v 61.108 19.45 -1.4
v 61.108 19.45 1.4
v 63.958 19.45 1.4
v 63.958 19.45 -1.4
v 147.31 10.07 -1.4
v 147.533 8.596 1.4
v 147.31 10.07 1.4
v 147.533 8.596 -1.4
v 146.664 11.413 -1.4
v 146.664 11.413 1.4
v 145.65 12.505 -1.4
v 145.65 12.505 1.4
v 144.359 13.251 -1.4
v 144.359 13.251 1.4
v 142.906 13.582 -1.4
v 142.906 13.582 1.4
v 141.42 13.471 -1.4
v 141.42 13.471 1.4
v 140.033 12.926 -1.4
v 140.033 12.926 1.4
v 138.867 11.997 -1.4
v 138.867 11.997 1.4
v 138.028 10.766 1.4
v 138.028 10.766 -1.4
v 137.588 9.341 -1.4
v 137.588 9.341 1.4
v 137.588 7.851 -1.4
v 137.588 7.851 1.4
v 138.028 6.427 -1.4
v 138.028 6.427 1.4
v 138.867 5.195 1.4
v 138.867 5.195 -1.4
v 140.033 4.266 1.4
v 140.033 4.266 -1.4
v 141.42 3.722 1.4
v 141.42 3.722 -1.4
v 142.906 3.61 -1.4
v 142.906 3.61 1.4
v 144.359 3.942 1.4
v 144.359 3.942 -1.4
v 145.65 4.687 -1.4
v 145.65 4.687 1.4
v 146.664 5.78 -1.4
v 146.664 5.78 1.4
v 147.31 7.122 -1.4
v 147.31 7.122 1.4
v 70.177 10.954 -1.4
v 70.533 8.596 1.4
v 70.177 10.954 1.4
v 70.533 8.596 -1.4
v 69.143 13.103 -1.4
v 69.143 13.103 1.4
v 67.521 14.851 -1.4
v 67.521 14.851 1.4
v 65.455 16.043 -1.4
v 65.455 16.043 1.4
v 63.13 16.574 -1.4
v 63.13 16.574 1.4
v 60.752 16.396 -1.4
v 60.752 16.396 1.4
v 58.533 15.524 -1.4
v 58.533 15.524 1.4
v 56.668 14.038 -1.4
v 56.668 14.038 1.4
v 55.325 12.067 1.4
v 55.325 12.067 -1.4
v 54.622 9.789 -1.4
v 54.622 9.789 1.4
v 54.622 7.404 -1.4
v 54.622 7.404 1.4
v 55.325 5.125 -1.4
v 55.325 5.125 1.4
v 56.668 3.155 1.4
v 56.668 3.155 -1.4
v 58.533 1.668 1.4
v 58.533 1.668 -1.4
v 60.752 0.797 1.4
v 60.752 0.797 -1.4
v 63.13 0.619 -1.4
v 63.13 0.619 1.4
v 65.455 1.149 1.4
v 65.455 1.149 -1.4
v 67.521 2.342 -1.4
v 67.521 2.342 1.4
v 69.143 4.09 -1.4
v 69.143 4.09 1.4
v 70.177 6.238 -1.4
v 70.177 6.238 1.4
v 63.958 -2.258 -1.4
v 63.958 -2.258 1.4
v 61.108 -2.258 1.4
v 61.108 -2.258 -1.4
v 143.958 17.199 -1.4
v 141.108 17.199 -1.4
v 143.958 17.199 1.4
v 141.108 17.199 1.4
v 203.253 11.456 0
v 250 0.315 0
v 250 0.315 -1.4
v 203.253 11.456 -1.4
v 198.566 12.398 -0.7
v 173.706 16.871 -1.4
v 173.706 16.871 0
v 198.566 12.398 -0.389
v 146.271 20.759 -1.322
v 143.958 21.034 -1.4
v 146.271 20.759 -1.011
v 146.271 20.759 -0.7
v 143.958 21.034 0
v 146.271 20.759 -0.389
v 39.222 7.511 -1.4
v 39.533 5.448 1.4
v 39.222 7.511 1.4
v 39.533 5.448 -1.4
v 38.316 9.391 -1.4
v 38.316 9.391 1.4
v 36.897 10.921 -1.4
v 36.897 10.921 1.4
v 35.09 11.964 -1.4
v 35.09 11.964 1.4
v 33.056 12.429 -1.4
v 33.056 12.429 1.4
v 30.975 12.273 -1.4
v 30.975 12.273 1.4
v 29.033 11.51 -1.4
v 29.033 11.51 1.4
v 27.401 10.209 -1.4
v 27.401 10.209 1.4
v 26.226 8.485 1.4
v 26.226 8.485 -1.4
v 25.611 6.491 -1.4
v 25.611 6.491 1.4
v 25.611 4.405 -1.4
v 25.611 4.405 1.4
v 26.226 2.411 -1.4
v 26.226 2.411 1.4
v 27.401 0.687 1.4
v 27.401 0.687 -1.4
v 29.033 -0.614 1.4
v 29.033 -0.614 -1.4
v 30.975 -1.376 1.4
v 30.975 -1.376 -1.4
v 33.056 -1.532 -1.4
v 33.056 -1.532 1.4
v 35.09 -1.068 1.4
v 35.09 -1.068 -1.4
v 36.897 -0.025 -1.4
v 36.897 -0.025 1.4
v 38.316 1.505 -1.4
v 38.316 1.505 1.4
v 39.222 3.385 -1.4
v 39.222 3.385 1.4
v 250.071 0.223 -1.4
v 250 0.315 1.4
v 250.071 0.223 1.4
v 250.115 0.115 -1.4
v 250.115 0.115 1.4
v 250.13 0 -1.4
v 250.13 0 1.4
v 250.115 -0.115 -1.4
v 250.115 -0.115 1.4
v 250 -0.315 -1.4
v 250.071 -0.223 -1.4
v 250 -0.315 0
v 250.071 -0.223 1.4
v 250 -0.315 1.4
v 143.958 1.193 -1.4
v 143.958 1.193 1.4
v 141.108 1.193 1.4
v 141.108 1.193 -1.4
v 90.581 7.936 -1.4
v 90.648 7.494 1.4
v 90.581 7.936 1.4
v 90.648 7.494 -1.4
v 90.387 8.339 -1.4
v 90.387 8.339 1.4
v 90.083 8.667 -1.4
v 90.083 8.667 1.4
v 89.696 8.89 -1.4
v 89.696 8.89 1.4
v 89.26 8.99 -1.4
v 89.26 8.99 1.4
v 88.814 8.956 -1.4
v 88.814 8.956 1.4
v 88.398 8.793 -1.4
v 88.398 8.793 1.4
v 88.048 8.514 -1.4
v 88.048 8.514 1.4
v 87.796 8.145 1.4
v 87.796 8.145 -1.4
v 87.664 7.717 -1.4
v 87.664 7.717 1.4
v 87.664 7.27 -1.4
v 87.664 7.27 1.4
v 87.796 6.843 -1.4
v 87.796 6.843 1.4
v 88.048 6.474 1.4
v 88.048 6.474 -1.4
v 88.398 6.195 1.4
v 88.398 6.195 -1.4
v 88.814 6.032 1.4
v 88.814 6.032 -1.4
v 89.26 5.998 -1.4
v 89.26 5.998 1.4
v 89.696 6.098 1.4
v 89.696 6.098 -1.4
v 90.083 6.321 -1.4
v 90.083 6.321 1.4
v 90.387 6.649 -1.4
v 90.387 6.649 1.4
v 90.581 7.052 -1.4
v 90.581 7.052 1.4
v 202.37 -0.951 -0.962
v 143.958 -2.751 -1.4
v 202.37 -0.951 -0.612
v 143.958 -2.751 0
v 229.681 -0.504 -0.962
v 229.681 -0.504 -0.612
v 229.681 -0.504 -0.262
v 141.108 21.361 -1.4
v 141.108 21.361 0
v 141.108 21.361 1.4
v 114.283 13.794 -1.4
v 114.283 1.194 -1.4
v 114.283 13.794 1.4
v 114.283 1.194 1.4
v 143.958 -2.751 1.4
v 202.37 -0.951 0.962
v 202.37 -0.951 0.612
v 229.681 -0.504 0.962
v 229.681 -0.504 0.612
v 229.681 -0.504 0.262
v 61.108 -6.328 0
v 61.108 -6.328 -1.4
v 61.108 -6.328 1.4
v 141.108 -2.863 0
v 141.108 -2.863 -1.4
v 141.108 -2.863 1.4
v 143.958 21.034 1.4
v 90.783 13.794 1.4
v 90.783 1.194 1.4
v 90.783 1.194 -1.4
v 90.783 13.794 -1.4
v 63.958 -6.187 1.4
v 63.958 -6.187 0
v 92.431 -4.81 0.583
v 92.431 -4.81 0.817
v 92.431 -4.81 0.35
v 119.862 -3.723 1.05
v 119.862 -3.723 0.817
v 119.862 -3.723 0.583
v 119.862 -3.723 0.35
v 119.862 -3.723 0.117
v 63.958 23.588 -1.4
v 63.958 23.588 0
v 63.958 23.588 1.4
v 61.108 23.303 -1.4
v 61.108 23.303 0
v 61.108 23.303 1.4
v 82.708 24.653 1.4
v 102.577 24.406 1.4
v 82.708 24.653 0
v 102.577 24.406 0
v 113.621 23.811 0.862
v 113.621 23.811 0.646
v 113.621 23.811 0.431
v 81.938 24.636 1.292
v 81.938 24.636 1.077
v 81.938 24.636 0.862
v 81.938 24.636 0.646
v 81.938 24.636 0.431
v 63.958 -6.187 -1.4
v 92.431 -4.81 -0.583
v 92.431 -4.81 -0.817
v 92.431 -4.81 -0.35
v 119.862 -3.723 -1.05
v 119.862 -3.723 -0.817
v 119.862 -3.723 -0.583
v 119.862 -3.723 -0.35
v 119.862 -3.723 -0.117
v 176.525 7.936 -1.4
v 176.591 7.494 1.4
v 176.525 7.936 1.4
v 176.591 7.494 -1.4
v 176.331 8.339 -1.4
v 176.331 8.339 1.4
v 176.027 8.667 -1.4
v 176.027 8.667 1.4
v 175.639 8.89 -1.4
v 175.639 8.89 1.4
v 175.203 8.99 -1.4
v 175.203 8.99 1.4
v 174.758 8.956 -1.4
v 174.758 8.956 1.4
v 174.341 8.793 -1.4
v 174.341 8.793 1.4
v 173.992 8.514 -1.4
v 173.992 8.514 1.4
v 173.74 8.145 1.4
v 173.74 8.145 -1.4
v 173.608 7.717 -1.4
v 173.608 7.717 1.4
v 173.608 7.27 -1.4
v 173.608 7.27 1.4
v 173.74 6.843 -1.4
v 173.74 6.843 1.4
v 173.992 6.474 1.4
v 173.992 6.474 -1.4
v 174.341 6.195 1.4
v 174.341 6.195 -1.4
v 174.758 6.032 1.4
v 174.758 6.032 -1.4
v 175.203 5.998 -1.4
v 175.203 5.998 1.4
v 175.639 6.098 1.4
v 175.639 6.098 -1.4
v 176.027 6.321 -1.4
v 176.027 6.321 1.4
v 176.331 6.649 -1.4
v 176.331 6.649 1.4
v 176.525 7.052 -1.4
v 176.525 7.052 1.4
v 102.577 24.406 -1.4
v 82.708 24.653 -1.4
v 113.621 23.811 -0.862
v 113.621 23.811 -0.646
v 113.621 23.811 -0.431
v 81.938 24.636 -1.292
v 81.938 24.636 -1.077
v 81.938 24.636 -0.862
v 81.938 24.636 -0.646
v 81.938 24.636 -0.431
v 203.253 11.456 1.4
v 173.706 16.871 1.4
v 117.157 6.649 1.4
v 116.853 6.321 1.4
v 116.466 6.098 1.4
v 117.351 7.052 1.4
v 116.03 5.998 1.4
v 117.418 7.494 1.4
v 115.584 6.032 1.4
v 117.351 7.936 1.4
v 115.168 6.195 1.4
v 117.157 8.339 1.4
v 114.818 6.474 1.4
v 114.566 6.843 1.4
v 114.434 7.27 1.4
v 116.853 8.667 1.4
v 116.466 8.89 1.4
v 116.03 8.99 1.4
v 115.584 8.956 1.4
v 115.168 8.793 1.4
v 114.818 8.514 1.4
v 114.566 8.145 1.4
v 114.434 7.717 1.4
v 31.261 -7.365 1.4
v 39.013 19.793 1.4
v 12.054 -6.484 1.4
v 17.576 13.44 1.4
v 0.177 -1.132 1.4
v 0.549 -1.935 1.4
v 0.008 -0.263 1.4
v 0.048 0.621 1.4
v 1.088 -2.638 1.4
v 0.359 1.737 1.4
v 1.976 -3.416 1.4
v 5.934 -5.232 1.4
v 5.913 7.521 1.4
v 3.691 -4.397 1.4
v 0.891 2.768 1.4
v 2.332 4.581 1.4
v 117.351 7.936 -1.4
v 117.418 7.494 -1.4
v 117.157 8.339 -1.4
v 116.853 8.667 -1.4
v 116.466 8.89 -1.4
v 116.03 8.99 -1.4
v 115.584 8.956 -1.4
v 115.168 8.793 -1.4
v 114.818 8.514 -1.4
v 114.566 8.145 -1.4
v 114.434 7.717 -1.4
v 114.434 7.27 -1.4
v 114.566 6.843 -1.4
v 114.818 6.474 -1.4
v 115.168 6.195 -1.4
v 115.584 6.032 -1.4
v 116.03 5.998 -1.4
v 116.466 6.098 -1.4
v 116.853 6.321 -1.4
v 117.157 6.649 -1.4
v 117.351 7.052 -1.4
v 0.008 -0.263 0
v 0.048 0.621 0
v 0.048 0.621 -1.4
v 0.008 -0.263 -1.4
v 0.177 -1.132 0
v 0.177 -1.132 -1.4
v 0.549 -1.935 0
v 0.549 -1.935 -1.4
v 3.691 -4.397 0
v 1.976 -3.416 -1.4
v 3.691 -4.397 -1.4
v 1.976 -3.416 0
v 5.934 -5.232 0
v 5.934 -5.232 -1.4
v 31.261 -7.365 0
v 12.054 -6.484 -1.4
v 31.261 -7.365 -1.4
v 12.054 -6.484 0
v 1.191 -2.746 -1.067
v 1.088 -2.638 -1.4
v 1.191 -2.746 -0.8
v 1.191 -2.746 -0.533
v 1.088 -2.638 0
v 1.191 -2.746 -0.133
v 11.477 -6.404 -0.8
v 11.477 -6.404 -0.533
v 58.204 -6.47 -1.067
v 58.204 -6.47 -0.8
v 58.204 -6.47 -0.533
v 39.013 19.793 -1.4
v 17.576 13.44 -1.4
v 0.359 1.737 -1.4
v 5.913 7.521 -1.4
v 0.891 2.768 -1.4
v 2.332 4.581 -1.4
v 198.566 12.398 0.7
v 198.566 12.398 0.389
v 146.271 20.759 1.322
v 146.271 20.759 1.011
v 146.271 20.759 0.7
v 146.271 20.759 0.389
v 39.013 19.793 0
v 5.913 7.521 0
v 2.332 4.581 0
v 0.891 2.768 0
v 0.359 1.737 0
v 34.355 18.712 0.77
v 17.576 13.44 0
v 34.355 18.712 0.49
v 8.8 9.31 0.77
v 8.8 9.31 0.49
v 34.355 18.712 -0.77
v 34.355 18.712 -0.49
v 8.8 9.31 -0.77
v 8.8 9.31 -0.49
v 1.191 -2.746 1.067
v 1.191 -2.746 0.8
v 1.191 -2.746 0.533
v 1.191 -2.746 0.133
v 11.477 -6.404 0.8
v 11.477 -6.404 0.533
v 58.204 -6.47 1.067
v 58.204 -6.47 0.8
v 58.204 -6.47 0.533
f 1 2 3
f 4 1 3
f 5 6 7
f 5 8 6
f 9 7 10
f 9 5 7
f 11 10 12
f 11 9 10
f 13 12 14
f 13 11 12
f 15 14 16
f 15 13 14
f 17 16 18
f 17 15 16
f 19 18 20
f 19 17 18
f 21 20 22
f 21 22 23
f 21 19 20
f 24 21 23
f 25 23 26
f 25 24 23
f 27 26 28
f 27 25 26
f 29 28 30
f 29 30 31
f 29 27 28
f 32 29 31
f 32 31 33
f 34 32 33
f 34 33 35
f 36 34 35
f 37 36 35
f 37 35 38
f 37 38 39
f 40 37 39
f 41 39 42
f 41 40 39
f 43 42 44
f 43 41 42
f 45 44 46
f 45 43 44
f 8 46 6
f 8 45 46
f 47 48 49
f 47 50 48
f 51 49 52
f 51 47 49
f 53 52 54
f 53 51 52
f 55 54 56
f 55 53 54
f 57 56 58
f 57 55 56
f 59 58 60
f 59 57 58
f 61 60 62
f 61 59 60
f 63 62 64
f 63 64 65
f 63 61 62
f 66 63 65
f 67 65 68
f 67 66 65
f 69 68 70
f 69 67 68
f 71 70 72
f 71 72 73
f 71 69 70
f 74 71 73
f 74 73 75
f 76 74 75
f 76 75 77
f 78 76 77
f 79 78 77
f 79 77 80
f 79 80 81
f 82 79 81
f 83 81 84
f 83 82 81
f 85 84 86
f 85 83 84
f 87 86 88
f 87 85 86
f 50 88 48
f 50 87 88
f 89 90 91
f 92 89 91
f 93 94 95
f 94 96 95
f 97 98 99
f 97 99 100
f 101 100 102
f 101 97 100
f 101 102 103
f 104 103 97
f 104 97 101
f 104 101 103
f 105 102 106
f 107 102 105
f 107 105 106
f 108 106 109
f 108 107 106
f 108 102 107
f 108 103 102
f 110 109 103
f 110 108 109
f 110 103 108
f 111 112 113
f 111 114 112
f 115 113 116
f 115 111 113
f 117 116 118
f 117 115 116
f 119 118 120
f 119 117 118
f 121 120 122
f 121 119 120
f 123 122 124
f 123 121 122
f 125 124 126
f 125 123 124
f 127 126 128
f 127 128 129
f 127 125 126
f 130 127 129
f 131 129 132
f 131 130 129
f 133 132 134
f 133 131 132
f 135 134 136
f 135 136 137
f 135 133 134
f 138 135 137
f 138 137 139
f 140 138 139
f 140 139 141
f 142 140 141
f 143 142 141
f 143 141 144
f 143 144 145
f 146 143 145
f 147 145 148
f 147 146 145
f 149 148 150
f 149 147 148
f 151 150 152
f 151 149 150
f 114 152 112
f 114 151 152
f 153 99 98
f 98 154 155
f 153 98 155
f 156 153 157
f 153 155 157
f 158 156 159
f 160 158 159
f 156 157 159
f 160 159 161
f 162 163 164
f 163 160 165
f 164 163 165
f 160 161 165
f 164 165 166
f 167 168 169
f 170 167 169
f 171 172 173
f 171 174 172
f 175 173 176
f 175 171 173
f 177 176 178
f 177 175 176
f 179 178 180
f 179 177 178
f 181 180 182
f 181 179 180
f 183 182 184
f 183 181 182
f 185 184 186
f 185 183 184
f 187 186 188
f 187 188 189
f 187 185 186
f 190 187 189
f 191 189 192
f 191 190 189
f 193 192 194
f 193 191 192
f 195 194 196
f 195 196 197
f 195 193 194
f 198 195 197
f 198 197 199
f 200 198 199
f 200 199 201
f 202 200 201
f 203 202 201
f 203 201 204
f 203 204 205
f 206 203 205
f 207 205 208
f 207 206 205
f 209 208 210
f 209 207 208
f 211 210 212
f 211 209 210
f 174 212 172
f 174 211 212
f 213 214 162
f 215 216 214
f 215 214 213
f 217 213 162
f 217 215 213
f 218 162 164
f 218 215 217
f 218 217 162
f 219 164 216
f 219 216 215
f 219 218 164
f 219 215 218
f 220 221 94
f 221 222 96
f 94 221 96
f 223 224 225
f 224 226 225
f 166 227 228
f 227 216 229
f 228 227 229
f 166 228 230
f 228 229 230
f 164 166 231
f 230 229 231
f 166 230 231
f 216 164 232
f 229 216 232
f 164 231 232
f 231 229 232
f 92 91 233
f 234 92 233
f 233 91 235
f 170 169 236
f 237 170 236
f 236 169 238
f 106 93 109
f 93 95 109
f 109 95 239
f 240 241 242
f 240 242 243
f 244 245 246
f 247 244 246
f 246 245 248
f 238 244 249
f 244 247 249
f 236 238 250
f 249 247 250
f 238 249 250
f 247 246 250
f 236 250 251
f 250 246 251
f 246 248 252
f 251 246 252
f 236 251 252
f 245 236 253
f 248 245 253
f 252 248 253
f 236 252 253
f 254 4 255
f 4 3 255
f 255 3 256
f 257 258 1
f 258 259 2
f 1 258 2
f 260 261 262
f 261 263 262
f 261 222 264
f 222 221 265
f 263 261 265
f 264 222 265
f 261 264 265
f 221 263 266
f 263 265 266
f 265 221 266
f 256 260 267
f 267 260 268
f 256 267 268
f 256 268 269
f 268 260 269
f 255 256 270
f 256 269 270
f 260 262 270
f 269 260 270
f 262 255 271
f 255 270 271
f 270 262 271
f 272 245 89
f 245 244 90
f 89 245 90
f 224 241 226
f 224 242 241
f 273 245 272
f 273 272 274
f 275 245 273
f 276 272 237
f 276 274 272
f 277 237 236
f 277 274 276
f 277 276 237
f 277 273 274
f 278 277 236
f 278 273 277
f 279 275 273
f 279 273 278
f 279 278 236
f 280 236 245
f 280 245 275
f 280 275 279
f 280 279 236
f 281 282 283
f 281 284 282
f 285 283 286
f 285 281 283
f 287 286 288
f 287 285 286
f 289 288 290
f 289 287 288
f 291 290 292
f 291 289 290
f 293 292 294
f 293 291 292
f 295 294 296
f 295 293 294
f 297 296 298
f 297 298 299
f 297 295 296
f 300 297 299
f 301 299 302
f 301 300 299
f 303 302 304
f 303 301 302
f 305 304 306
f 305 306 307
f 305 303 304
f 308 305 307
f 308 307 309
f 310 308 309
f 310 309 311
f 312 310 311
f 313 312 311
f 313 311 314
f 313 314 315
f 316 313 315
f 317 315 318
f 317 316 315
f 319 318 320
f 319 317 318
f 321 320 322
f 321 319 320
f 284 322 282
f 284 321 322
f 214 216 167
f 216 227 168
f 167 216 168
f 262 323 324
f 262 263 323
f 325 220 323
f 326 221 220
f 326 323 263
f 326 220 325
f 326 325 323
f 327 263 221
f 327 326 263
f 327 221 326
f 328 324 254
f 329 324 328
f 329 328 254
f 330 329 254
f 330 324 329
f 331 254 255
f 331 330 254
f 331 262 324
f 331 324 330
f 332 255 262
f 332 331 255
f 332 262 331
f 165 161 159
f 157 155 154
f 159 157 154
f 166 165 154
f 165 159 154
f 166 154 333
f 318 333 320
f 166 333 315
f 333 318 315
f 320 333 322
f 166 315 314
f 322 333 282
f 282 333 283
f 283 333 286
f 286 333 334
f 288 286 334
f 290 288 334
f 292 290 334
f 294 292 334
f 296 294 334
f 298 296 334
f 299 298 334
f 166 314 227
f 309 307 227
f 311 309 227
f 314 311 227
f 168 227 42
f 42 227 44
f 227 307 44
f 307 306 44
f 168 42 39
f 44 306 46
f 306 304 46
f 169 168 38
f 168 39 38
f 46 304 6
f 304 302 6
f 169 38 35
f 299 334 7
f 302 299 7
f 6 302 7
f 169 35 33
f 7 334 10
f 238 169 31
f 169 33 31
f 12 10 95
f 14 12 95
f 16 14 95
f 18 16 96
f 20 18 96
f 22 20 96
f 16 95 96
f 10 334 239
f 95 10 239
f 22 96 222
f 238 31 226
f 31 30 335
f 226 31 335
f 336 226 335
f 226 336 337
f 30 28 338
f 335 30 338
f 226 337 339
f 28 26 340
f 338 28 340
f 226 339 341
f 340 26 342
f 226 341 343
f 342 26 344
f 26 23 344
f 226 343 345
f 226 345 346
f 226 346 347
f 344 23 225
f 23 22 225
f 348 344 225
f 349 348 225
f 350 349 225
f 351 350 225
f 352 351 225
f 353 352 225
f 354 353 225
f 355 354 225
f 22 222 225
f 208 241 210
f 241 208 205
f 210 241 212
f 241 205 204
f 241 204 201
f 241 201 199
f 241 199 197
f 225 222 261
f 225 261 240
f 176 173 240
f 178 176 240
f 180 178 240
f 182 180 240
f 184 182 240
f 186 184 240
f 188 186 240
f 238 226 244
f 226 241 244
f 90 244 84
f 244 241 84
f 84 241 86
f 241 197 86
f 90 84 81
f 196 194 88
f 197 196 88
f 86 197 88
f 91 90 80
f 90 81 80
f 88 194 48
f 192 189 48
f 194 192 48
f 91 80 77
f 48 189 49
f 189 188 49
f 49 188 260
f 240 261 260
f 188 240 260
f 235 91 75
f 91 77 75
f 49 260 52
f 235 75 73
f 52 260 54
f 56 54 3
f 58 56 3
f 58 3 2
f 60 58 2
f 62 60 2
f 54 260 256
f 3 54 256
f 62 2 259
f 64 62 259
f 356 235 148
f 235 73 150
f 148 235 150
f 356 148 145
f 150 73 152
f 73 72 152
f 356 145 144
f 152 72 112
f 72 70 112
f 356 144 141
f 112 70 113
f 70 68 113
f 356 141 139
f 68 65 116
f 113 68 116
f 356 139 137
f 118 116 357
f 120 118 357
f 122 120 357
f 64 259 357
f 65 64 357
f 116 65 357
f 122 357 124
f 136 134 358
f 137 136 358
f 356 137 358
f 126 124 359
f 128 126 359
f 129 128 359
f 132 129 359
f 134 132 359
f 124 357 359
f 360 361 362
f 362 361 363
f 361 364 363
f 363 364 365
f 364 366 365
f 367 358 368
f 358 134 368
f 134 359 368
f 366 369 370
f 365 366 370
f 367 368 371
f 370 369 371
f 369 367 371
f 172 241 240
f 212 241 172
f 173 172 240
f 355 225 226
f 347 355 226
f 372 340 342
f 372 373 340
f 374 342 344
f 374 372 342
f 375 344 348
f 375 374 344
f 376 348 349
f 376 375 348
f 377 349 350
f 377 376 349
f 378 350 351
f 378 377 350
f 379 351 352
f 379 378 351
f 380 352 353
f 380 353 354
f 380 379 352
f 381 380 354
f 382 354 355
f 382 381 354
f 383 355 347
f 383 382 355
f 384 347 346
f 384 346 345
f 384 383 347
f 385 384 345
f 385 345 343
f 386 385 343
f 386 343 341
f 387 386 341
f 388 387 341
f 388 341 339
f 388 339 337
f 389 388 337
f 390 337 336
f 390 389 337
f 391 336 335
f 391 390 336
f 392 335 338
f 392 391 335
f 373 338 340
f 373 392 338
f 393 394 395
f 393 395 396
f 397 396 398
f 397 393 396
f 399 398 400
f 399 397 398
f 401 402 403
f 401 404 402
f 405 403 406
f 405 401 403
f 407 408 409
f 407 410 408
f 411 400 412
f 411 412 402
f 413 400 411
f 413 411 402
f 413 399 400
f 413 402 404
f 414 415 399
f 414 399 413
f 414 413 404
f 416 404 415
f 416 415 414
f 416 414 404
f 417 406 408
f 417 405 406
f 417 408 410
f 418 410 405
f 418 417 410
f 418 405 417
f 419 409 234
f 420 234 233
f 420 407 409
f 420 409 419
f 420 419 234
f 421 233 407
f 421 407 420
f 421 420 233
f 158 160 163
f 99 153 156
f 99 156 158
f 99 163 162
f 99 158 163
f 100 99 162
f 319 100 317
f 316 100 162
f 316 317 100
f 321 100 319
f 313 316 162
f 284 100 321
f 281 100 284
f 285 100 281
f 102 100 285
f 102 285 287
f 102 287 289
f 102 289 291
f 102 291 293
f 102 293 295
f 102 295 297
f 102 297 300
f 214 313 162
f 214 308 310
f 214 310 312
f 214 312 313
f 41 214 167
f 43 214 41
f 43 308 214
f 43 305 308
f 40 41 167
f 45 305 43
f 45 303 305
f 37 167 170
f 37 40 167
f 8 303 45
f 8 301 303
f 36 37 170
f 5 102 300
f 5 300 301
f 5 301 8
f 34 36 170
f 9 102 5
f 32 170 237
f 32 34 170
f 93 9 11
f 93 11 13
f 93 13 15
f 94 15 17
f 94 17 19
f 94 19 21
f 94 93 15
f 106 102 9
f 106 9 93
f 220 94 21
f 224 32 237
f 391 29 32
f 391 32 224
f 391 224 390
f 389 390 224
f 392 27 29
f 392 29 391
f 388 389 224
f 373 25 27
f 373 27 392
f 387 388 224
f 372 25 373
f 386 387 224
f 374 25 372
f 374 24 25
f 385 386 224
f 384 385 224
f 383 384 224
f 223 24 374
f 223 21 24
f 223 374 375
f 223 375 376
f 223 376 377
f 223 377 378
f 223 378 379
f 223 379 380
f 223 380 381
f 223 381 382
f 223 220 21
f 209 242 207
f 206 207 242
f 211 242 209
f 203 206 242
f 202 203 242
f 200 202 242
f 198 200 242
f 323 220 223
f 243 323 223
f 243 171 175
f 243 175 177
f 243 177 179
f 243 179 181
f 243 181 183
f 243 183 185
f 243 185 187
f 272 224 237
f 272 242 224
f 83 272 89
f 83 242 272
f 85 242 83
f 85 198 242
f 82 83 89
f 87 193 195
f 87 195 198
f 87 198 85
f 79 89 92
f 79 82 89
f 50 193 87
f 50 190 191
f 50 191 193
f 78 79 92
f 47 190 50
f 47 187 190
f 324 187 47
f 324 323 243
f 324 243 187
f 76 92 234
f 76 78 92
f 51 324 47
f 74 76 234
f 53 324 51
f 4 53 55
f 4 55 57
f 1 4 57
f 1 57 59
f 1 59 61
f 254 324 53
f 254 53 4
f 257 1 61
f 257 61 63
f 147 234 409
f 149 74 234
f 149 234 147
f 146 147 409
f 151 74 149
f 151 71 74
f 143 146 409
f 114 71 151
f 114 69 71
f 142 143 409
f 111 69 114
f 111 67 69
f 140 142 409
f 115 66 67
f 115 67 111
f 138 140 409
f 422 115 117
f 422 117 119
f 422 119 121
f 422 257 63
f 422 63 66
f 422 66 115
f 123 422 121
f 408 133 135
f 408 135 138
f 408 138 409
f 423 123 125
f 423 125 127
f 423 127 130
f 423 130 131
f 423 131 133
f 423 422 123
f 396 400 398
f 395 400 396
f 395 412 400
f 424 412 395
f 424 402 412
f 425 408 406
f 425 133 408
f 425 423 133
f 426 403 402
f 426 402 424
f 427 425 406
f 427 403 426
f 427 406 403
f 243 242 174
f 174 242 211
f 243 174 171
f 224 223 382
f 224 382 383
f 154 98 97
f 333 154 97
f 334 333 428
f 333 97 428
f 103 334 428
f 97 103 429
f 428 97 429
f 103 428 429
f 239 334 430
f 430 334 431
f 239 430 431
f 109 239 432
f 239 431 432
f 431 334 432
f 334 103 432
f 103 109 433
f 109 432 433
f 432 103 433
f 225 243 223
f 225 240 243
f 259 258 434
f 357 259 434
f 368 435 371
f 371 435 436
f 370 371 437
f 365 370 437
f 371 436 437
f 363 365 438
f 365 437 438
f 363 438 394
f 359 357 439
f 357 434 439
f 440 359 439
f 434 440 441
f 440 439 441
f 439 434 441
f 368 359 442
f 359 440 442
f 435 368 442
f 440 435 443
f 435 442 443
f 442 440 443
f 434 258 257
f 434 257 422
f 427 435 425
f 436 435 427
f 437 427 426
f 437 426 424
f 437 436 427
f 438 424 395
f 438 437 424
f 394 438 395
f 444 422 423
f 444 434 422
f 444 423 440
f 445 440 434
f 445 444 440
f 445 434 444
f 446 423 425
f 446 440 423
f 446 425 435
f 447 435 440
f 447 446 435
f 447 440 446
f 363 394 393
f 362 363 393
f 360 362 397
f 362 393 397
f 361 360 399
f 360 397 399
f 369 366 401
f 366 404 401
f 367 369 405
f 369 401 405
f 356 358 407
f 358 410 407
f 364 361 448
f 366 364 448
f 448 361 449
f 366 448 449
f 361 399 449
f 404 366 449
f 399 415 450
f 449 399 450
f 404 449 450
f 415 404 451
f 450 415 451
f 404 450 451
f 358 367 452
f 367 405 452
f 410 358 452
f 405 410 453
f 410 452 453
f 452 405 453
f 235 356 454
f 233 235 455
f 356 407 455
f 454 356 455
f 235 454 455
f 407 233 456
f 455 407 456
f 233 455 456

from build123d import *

# Parameters (mm, degrees)
SKETCH_1_R      = 8
SKETCH_1_R_2    = 5
SKETCH_1_R_3    = 7
SKETCH_1_R_4    = 1.5
SKETCH_1_W      = 23.5
SKETCH_1_H      = 12.6
EXTRUDE_1_DEPTH = 1.4


with BuildPart() as part:
    # Эскиз1 → Бобышка-Вытянуть1 (new, symmetric)
    with BuildSketch(Plane.XY):
        with BuildLine():
            Line((61.107619318, 19.450139662), (63.957619318, 19.450139662))
            Line((63.957619318, 19.450139662), (63.957619318, 23.588464287))
            add(Edge.make_bspline(
                [(141.107619318, 21.360787161), (140.647203073, 21.412583326), (138.008124909, 21.706530989), (133.19183673, 22.212004255), (126.658683026, 22.825721434), (120.136770918, 23.363973271), (113.62856714, 23.824677329), (107.152732037, 24.200242598), (100.741095693, 24.498399513), (94.411752715, 24.686649771), (88.155917993, 24.740095652), (81.949043055, 24.658849145), (75.780520591, 24.441013809), (69.785413798, 24.089605746), (65.850842722, 23.766532071), (63.957619318, 23.588464287)],
                knots=[0.429723551, 0.429723551, 0.429723551, 0.429723551, 0.435103874, 0.460559416, 0.485959195, 0.51130307, 0.536551515, 0.561723366, 0.586628867, 0.611085431, 0.6352512, 0.659272176, 0.683163753, 0.706922144, 0.729003809, 0.729003809, 0.729003809, 0.729003809], degree=3))
            Line((141.107619318, 21.360787161), (141.107619318, 17.19883932))
            Line((141.107619318, 17.19883932), (143.957619318, 17.19883932))
            Line((143.957619318, 17.19883932), (143.957619318, 21.033629847))
            add(Edge.make_bspline(
                [(250, 0.315), (249.15566774, 0.545019818), (246.720175698, 1.208516243), (242.391332083, 2.358339053), (236.849761204, 3.787625364), (230.779918279, 5.298008837), (224.455917947, 6.812866028), (218.030543496, 8.291610632), (211.562405045, 9.719735057), (205.072411509, 11.092374932), (198.567970913, 12.407850726), (192.052369914, 13.665297924), (185.527619973, 14.864093303), (178.995338991, 16.003404779), (172.457064741, 17.082388115), (165.914317095, 18.099827841), (159.368680729, 19.054501815), (152.821805128, 19.944885603), (147.683892721, 20.591912914), (144.728786809, 20.943344409), (143.957619318, 21.033629847)],
                knots=[0, 0, 0, 0, 0.0101622, 0.029313053, 0.052011605, 0.076619468, 0.101948061, 0.127526132, 0.153184131, 0.178867888, 0.204557903, 0.230245712, 0.255925967, 0.281594302, 0.30724642, 0.332878042, 0.358484538, 0.384061186, 0.409602822, 0.418619192, 0.418619192, 0.418619192, 0.418619192], degree=3))
            ThreePointArc((250, 0.315), (250.130477272, 0), (250, -0.315))
            add(Edge.make_bspline(
                [(143.957619318, -2.751209627), (145.13020609, -2.705557458), (148.596084852, -2.571725453), (154.352602411, -2.355626415), (161.225044134, -2.109369921), (168.090869746, -1.876634074), (174.951578522, -1.658643104), (181.808595966, -1.456378123), (188.663234462, -1.270383377), (195.516645168, -1.101112884), (202.369532894, -0.948617189), (211.49919029, -0.767742353), (220.603098666, -0.619939742), (229.617630172, -0.50292618), (236.087353854, -0.431514192), (241.980776913, -0.376520461), (246.558970011, -0.339535886), (249.120490965, -0.321271242), (250, -0.315)],
                knots=[0.581490104, 0.581490104, 0.581490104, 0.581490104, 0.595379569, 0.622543445, 0.64967326, 0.676775201, 0.703855228, 0.730918775, 0.757971338, 0.785017763, 0.812061651, 0.839103366, 0.893099152, 0.919831065, 0.945809917, 0.969680601, 0.989589706, 1, 1, 1, 1], degree=3))
            Line((143.957619318, -2.751209627), (143.957619318, 1.193130543))
            Line((143.957619318, 1.193130543), (141.107619318, 1.193130543))
            Line((141.107619318, 1.193130543), (141.107619318, -2.86287629))
            add(Edge.make_bspline(
                [(63.957619318, -6.186566126), (64.317823095, -6.168514758), (66.969747676, -6.035316313), (71.910772709, -5.784005174), (78.771375576, -5.439680449), (85.610498609, -5.110951246), (92.432107589, -4.804953317), (99.25503119, -4.531981644), (106.097378404, -4.278274658), (112.96921168, -4.00308991), (119.864404254, -3.723176166), (126.773860473, -3.440067276), (133.855552455, -3.151608468), (138.633361552, -2.960411351), (141.107619318, -2.86287629)],
                knots=[0.265564796, 0.265564796, 0.265564796, 0.265564796, 0.269833583, 0.296993022, 0.324123272, 0.351139107, 0.378035509, 0.404946016, 0.431960837, 0.459078395, 0.4863474, 0.51364083, 0.540928595, 0.570237104, 0.570237104, 0.570237104, 0.570237104], degree=3))
            Line((63.957619318, -6.186566126), (63.957619318, -2.257745247))
            Line((63.957619318, -2.257745247), (61.107619318, -2.257745247))
            Line((61.107619318, -2.257745247), (61.107619318, -6.32836923))
            add(Edge.make_bspline(
                [(0.047975, 0.621425001), (0.02271382, 0.373490086), (-0.027820789, -0.122499974), (0.077991212, -0.884434589), (0.34969565, -1.63883807), (0.814331135, -2.365068923), (1.46348078, -3.039275244), (2.290973016, -3.660999469), (3.30592875, -4.23577962), (4.535255619, -4.773674143), (6.029745688, -5.282192164), (7.868981215, -5.765316676), (10.168831391, -6.221716592), (13.075438188, -6.63961873), (16.728115362, -6.992956737), (21.189952096, -7.247345144), (26.399984415, -7.376638848), (32.197398564, -7.376256913), (38.397806759, -7.261436579), (44.857621768, -7.056641358), (51.486543096, -6.786453532), (56.920566709, -6.533358441), (60.139839208, -6.376114839), (61.107619318, -6.32836923)],
                knots=[0, 0, 0, 0, 0.002941446, 0.005884319, 0.00901613, 0.012364547, 0.016007934, 0.020036845, 0.024573728, 0.029783835, 0.03589701, 0.04324044, 0.052275965, 0.063634589, 0.077983176, 0.095698161, 0.116520086, 0.13966073, 0.16431217, 0.18991889, 0.216157201, 0.242837762, 0.254306514, 0.254306514, 0.254306514, 0.254306514], degree=3))
            add(Edge.make_bspline(
                [(61.107619318, 23.303137173), (59.917945614, 23.176751945), (56.739740439, 22.81448979), (51.605762688, 22.119065522), (45.744400311, 21.156564432), (39.995857594, 20.03537139), (34.397919842, 18.756316235), (29.010382103, 17.327615608), (23.925798408, 15.771864922), (19.27067884, 14.134269435), (15.179098391, 12.483335438), (11.74047579, 10.895610996), (8.959371869, 9.429577366), (6.76089118, 8.1086032), (5.033709748, 6.924638056), (3.671694933, 5.854229665), (2.592101123, 4.871305369), (1.738175668, 3.952595744), (1.06987083, 3.080946374), (0.57164541, 2.241622103), (0.215773899, 1.430785398), (0.102255581, 0.883241695), (0.047975, 0.621425001)],
                knots=[0.740090669, 0.740090669, 0.740090669, 0.740090669, 0.7539832, 0.77723469, 0.800246382, 0.822950709, 0.845237155, 0.866915896, 0.887662335, 0.906968281, 0.924203157, 0.938878975, 0.950931611, 0.960693484, 0.968646729, 0.975232933, 0.980794744, 0.985583761, 0.989781539, 0.993521313, 0.996902113, 1, 1, 1, 1], degree=3))
            Line((61.107619318, 23.303137173), (61.107619318, 19.450139662))
        make_face()
        with Locations((62.532619318, 8.596197208)):
            Circle(SKETCH_1_R, mode=Mode.SUBTRACT)
        with Locations((142.532619318, 8.596197208)):
            Circle(SKETCH_1_R_2, mode=Mode.SUBTRACT)
        with Locations((32.532619318, 5.448144701)):
            Circle(SKETCH_1_R_3, mode=Mode.SUBTRACT)
        with Locations((175.091334091, 7.493910357)):
            Circle(SKETCH_1_R_4, mode=Mode.SUBTRACT)
        with Locations((115.917619318, 7.493910357)):
            Circle(SKETCH_1_R_4, mode=Mode.SUBTRACT)
        with Locations((89.147619318, 7.493910357)):
            Circle(SKETCH_1_R_4, mode=Mode.SUBTRACT)
        with Locations((102.532619318, 7.493910357)):
            Rectangle(SKETCH_1_W, SKETCH_1_H, mode=Mode.SUBTRACT)
    extrude(amount=EXTRUDE_1_DEPTH, both=True)


solid = part.part
